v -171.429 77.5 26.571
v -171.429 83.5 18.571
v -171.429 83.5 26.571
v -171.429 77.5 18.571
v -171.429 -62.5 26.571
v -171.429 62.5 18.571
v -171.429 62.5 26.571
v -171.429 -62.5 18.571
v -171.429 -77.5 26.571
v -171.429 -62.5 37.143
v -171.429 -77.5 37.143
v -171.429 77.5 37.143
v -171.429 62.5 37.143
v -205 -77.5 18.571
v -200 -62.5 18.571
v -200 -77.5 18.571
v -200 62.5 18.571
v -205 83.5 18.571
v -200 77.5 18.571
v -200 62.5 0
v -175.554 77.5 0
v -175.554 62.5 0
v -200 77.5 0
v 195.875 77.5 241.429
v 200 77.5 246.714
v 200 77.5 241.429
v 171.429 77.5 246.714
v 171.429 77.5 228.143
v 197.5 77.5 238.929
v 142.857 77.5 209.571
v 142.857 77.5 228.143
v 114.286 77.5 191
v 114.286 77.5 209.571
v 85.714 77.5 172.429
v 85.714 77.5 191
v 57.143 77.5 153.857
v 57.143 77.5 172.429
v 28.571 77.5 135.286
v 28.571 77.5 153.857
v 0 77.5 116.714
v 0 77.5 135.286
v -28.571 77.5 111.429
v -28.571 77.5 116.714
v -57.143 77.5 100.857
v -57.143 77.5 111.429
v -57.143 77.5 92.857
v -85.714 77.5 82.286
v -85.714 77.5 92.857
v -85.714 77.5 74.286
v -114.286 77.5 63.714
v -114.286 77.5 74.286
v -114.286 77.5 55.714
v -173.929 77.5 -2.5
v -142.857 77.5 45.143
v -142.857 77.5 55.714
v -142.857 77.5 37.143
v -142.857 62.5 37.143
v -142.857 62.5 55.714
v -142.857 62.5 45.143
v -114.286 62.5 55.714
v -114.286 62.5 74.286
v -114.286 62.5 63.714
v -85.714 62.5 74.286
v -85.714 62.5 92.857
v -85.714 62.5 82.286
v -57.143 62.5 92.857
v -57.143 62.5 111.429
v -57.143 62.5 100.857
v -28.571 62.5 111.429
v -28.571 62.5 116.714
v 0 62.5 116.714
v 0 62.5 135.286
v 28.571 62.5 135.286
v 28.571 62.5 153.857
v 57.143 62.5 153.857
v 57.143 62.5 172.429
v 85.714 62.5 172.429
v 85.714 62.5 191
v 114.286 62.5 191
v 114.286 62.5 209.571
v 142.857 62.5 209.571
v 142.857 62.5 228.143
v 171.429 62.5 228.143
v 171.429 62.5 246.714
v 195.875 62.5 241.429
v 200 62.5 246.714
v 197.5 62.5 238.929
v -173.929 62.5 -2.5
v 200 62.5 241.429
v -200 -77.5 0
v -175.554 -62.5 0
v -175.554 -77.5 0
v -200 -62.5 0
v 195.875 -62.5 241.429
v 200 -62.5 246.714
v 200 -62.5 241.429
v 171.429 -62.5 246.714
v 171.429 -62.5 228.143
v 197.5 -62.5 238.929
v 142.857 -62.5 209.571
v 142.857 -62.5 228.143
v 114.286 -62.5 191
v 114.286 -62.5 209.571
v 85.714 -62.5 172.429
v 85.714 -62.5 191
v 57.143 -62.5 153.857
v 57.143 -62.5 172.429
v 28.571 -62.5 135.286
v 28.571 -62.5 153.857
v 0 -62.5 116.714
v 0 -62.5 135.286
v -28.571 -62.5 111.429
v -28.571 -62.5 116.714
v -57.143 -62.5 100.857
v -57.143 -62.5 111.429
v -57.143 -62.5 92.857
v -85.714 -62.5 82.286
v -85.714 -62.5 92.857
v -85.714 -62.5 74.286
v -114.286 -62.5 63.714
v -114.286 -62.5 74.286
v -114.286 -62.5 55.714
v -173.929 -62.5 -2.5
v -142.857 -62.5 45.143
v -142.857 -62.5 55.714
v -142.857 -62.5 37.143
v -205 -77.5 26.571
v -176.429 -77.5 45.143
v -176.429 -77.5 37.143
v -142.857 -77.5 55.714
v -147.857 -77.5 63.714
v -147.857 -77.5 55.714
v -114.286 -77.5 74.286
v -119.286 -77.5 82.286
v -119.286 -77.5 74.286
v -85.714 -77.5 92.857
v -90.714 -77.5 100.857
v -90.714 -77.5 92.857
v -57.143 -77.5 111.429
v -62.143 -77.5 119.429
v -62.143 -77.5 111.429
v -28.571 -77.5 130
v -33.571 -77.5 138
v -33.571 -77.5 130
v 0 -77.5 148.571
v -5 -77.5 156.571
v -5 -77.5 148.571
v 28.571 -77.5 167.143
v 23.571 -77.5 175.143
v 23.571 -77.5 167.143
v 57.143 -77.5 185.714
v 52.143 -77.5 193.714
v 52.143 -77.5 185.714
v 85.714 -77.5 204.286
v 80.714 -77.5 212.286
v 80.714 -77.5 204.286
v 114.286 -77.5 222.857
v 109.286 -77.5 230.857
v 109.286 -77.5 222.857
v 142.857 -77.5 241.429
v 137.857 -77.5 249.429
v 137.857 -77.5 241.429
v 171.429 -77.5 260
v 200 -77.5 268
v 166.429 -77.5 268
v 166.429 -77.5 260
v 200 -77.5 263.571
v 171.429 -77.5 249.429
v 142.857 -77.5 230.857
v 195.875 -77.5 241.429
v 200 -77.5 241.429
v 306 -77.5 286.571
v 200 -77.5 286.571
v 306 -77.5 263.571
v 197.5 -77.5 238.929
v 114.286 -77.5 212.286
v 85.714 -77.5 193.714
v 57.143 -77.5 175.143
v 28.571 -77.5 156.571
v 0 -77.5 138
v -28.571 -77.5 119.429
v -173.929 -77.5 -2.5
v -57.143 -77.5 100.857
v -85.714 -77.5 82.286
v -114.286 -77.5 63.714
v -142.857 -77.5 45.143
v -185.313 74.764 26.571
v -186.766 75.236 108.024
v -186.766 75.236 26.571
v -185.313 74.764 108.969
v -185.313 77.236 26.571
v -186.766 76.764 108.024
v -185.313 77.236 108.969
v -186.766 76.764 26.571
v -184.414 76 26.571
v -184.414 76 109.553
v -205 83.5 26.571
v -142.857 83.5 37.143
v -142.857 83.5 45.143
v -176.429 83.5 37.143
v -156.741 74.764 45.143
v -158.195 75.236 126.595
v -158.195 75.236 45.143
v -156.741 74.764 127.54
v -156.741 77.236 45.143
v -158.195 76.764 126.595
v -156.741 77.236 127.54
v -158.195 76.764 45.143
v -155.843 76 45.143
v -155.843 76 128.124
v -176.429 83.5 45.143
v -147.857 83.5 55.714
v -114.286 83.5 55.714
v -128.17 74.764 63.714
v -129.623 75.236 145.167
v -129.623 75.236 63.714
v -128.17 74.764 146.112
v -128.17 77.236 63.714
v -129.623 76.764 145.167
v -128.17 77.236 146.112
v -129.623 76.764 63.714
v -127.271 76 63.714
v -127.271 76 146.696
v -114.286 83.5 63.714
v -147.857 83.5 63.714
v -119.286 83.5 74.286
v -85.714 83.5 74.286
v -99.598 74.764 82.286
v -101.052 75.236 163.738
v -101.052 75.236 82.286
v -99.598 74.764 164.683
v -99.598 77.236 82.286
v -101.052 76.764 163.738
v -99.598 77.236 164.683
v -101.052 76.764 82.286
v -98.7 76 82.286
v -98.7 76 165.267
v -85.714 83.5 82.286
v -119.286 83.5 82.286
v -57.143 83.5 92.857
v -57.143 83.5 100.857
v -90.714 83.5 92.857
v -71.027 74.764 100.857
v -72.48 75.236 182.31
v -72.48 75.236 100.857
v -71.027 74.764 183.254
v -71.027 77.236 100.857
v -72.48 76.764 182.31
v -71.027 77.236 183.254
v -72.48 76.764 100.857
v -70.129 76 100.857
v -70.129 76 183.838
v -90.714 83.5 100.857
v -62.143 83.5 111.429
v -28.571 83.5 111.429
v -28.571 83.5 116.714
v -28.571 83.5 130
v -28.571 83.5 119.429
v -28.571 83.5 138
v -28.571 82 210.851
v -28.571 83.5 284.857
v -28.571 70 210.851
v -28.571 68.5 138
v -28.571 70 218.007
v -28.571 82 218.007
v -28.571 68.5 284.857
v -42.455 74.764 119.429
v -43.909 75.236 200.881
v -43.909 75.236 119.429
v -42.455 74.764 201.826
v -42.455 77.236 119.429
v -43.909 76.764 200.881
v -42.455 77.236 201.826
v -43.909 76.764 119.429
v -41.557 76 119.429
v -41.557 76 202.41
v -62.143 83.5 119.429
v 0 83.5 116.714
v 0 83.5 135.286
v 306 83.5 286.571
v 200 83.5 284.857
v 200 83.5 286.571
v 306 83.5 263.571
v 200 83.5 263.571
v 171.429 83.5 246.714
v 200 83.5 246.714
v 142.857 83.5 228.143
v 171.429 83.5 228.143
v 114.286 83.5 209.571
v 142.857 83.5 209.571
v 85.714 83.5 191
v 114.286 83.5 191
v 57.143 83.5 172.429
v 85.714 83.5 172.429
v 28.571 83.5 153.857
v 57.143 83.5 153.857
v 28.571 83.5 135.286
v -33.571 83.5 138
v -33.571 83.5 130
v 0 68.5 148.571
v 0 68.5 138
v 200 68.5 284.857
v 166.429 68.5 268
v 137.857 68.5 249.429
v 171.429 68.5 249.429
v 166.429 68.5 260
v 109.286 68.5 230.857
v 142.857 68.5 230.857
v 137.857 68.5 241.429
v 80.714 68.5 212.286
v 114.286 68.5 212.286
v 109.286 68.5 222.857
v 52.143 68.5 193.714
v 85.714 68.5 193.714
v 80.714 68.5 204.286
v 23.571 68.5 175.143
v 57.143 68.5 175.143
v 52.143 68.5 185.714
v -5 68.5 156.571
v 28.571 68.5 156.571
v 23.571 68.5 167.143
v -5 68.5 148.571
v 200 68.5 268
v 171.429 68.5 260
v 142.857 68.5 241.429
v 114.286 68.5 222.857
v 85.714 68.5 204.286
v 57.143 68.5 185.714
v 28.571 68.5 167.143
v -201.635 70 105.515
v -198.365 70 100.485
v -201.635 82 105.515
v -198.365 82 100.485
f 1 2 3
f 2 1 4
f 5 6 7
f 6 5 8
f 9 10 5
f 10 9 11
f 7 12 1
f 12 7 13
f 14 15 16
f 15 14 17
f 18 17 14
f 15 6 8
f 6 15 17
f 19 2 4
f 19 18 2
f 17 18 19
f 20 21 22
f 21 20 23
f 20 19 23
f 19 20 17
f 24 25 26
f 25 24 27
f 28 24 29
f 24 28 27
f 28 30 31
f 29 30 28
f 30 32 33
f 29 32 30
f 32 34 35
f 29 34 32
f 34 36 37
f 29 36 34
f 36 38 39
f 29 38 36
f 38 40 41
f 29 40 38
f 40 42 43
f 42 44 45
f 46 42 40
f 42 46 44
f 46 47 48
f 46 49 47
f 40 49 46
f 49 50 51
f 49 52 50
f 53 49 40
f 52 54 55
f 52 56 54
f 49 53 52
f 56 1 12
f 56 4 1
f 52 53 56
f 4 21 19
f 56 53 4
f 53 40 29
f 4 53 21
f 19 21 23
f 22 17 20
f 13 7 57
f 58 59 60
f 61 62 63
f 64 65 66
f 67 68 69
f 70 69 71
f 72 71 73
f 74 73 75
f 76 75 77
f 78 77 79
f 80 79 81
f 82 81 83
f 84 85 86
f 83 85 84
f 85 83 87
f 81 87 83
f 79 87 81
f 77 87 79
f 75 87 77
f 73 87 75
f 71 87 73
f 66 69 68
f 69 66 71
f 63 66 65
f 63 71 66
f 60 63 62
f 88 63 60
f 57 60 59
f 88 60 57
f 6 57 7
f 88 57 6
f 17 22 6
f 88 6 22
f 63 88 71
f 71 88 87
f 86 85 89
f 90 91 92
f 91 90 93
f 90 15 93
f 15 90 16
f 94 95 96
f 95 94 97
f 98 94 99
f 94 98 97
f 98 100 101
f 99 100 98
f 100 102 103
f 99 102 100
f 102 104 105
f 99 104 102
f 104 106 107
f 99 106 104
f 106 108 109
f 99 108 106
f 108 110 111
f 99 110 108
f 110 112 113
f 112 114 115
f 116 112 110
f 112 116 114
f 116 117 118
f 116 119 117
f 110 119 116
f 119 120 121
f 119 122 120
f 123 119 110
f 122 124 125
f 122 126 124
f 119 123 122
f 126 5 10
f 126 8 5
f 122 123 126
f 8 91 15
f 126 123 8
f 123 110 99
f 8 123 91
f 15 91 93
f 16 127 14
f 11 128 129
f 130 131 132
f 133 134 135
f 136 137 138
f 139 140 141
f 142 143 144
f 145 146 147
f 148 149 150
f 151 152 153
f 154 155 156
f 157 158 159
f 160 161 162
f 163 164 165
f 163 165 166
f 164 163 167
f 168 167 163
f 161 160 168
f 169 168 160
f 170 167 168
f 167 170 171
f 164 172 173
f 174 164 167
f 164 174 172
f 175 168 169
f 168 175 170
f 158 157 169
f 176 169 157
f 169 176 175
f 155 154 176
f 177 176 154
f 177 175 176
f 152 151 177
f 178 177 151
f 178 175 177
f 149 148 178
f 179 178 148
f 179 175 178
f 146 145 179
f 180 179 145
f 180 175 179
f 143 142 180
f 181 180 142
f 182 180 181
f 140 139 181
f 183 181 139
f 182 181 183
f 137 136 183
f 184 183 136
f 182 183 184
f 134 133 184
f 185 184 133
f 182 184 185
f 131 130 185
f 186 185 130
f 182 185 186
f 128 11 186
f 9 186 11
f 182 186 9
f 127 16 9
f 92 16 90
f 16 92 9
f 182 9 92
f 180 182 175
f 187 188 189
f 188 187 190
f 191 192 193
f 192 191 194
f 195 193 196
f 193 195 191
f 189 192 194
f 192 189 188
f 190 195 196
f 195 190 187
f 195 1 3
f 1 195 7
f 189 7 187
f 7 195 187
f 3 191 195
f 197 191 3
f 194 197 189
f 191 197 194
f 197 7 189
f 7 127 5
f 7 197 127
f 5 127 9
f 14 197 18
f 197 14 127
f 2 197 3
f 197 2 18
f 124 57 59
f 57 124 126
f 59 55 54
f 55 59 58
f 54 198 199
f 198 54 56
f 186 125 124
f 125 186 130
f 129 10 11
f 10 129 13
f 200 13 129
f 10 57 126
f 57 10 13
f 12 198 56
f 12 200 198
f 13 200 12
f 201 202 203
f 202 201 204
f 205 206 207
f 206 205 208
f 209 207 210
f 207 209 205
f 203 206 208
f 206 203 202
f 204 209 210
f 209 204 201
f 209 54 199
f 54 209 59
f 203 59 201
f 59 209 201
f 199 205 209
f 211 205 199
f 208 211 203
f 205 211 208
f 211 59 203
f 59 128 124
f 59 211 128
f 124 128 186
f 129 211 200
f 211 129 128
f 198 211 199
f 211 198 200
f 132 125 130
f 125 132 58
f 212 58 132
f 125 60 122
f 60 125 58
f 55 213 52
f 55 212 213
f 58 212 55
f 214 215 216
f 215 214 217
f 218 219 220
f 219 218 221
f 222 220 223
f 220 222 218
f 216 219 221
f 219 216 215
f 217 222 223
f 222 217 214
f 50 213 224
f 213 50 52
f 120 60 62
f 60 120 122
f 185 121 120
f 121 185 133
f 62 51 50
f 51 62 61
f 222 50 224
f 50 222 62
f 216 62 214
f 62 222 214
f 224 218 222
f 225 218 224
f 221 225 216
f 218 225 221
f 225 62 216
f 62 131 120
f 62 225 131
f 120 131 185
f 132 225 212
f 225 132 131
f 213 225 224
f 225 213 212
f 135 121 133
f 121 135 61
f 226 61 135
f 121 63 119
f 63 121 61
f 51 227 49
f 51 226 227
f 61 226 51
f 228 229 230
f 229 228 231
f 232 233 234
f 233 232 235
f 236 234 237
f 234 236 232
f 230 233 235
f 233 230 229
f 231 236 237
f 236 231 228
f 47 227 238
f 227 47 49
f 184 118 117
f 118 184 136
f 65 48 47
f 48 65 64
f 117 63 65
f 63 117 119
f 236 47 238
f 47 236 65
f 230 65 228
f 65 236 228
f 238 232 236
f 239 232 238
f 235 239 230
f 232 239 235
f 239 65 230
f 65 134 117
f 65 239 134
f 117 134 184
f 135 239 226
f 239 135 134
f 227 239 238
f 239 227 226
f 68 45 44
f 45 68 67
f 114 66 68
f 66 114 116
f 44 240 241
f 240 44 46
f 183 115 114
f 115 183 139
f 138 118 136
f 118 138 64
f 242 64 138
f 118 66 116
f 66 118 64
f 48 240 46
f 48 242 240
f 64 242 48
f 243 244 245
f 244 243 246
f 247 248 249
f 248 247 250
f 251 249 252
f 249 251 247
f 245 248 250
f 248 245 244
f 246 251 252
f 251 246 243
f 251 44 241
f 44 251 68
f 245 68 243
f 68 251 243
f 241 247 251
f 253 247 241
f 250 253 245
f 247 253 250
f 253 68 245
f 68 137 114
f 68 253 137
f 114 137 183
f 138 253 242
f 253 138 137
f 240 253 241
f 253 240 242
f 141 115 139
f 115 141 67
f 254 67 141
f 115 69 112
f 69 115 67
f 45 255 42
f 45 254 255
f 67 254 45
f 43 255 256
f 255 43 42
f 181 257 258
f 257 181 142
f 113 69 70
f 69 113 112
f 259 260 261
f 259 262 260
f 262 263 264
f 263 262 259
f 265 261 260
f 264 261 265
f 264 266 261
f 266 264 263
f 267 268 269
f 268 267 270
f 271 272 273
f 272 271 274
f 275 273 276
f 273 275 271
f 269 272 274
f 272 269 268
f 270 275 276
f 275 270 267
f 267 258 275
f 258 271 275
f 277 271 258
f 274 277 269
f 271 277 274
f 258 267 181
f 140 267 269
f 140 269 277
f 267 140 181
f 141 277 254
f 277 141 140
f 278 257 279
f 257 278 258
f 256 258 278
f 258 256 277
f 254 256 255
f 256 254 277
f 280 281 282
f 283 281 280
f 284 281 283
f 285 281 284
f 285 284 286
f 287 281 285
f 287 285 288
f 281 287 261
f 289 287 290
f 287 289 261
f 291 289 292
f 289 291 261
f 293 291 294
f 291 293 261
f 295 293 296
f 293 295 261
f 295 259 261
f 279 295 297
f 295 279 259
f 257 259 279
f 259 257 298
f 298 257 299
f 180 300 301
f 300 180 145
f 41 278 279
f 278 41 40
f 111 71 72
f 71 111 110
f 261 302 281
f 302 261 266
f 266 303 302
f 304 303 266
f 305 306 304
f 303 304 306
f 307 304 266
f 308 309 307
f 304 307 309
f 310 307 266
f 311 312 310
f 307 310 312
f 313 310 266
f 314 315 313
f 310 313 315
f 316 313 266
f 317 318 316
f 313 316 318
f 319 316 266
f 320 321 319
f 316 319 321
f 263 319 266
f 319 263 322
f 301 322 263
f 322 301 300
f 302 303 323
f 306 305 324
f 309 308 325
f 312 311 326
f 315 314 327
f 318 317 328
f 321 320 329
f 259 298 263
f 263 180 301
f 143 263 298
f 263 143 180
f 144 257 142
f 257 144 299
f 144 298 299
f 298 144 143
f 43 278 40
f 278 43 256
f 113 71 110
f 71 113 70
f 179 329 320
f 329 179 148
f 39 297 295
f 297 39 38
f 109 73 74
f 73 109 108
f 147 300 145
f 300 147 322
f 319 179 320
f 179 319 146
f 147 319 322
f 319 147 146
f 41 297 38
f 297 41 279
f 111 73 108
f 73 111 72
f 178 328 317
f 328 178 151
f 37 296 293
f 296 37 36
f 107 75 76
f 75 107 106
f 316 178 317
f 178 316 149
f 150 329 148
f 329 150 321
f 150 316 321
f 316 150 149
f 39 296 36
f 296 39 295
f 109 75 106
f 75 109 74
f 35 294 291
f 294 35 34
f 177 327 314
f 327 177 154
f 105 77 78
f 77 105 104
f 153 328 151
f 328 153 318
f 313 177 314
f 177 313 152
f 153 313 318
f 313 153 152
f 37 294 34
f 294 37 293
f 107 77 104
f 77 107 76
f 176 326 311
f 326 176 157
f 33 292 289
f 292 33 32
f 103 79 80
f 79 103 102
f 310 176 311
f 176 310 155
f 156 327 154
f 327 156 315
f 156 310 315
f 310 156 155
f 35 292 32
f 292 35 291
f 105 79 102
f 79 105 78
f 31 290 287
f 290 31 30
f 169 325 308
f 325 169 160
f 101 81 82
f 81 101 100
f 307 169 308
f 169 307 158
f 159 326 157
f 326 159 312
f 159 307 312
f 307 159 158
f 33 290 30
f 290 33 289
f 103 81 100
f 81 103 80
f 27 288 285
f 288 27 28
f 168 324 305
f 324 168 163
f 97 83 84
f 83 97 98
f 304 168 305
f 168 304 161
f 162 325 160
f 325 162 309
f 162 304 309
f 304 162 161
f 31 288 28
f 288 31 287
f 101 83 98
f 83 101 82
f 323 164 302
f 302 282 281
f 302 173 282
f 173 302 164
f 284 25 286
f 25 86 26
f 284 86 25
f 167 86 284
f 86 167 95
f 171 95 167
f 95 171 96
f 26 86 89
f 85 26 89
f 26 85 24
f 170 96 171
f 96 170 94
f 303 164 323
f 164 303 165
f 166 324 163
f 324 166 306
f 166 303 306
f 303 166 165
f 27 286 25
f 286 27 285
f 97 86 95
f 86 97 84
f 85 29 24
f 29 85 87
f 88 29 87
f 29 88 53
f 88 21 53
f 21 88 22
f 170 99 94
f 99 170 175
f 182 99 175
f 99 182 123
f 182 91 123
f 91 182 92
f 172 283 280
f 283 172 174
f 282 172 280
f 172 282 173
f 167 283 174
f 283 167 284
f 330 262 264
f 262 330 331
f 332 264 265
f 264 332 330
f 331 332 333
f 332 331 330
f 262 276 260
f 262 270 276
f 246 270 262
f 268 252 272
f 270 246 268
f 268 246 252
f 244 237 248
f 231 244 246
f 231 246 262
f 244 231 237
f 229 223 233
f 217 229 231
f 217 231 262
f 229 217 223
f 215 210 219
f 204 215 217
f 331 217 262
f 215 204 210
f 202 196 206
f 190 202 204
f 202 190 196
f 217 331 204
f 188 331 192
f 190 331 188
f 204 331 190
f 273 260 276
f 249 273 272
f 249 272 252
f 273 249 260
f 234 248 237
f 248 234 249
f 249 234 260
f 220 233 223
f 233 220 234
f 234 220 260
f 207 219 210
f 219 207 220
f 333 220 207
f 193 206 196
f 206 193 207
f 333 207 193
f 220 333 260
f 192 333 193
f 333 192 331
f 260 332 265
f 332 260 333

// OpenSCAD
module longstairs2(length = 400, height = 260, width = 140, n_steps=14)
{
    beam_width = 15;
    stair_thickness = 8;
    wall_thickness = 15;
    
    x_step = length / n_steps;
    z_step = height / n_steps;
    extend_w = 6;
    extend_step = 5;
    balcony_size = 106;
    balcony_thickness = beam_width + stair_thickness;
    railing_height = 94;
    railing_bar_radius = 1.3;
    railing_pos = width/2 + 6;
    railing_w = 12;
    railing_thickness = 6;
    bar_railing_n = 6;
    
    stair_color=[230/255, 230/255, 230/255];
    side_color=[255/255, 255/255, 255/255];
    railing_bar_color = [0,0,0];
    railing_color = [0.3,0.1,0.1];
    stair_alpha = 1.0;
    
    union() {
            
        for (i = [0:n_steps-1])
        {
            x = x_step * i - length/2; 
            z = z_step * i;
            
            translate([x+0.5*x_step, width/2, z+0.5*z_step])
            color(side_color, stair_alpha)
            cube ([x_step, beam_width, z_step], center=true);
            
            translate([x+0.5*x_step, -width/2, z+0.5*z_step])
            color(side_color, stair_alpha)
            cube ([x_step, beam_width, z_step], center=true);
            
            if (i < bar_railing_n) {
                translate([x+0.5*x_step, railing_pos, z+1.5*z_step-stair_thickness])
                color(railing_bar_color)
                cylinder(h = railing_height, r = railing_bar_radius);
            }
            else {
                translate([x+0.5*x_step, railing_pos, (height + z)/2 +1.5*z_step-stair_thickness])
                color([1,1,1])
                cube([x_step, wall_thickness, height-z+10], center=true);
            }
            translate([x+0.5*x_step-extend_step/2, 
                +extend_w/2, 
                z+1.0*z_step + stair_thickness/2])
            color(stair_color, stair_alpha)
            cube ([x_step+extend_step, 
                width+beam_width+extend_w, 
                stair_thickness], center=true);
            
            if (i >= bar_railing_n) {
                translate([x+0.5*x_step, 
                    +extend_w/2, 
                    z+1.0*z_step - stair_thickness/2])
                color(stair_color, stair_alpha)
                cube ([x_step, 
                    width+beam_width+extend_w, 
                    z_step], center=true);
            }
        }
        
        dx = x_step * (n_steps-1);
        dz = z_step * (n_steps-1);
        l = sqrt(dx*dx + dz*dz);
        w = sqrt(x_step*x_step + z_step*z_step);
        
        translate([x_step/4, width/2, height/2 - z_step/4])
        rotate([0, -atan2(z_step, x_step), 0])
        color(side_color, stair_alpha)
        cube ([l, beam_width, w*0.5], center=true);
        
        translate([x_step/4, -width/2, height/2 - z_step/4])
        rotate([0, -atan2(z_step, x_step), 0])
        color(side_color, stair_alpha)
        cube ([l, beam_width, w*0.5], center=true);
        
        translate([(n_steps-1)*x_step/2+0.5*x_step + balcony_size/2,
            extend_w/2, 
            (n_steps-1)*z_step+2.0*z_step - balcony_thickness/2 + stair_thickness])
        color(side_color, stair_alpha)
        cube ([balcony_size, width+beam_width+extend_w, balcony_thickness], center=true);
        
        dx2 = x_step * (bar_railing_n+1);
        dz2 = z_step * (bar_railing_n+1);
        l2 = sqrt(dx2*dx2 + dz2*dz2);
        
        translate([-dx2/2, railing_pos, railing_height + dz2/2+1.5*railing_thickness])
        rotate([0, -atan2(z_step, x_step), 0])
        color(railing_color)
        cube ([l2, railing_w, railing_thickness], center=true);
    }
}

// For testing
longstairs2();
